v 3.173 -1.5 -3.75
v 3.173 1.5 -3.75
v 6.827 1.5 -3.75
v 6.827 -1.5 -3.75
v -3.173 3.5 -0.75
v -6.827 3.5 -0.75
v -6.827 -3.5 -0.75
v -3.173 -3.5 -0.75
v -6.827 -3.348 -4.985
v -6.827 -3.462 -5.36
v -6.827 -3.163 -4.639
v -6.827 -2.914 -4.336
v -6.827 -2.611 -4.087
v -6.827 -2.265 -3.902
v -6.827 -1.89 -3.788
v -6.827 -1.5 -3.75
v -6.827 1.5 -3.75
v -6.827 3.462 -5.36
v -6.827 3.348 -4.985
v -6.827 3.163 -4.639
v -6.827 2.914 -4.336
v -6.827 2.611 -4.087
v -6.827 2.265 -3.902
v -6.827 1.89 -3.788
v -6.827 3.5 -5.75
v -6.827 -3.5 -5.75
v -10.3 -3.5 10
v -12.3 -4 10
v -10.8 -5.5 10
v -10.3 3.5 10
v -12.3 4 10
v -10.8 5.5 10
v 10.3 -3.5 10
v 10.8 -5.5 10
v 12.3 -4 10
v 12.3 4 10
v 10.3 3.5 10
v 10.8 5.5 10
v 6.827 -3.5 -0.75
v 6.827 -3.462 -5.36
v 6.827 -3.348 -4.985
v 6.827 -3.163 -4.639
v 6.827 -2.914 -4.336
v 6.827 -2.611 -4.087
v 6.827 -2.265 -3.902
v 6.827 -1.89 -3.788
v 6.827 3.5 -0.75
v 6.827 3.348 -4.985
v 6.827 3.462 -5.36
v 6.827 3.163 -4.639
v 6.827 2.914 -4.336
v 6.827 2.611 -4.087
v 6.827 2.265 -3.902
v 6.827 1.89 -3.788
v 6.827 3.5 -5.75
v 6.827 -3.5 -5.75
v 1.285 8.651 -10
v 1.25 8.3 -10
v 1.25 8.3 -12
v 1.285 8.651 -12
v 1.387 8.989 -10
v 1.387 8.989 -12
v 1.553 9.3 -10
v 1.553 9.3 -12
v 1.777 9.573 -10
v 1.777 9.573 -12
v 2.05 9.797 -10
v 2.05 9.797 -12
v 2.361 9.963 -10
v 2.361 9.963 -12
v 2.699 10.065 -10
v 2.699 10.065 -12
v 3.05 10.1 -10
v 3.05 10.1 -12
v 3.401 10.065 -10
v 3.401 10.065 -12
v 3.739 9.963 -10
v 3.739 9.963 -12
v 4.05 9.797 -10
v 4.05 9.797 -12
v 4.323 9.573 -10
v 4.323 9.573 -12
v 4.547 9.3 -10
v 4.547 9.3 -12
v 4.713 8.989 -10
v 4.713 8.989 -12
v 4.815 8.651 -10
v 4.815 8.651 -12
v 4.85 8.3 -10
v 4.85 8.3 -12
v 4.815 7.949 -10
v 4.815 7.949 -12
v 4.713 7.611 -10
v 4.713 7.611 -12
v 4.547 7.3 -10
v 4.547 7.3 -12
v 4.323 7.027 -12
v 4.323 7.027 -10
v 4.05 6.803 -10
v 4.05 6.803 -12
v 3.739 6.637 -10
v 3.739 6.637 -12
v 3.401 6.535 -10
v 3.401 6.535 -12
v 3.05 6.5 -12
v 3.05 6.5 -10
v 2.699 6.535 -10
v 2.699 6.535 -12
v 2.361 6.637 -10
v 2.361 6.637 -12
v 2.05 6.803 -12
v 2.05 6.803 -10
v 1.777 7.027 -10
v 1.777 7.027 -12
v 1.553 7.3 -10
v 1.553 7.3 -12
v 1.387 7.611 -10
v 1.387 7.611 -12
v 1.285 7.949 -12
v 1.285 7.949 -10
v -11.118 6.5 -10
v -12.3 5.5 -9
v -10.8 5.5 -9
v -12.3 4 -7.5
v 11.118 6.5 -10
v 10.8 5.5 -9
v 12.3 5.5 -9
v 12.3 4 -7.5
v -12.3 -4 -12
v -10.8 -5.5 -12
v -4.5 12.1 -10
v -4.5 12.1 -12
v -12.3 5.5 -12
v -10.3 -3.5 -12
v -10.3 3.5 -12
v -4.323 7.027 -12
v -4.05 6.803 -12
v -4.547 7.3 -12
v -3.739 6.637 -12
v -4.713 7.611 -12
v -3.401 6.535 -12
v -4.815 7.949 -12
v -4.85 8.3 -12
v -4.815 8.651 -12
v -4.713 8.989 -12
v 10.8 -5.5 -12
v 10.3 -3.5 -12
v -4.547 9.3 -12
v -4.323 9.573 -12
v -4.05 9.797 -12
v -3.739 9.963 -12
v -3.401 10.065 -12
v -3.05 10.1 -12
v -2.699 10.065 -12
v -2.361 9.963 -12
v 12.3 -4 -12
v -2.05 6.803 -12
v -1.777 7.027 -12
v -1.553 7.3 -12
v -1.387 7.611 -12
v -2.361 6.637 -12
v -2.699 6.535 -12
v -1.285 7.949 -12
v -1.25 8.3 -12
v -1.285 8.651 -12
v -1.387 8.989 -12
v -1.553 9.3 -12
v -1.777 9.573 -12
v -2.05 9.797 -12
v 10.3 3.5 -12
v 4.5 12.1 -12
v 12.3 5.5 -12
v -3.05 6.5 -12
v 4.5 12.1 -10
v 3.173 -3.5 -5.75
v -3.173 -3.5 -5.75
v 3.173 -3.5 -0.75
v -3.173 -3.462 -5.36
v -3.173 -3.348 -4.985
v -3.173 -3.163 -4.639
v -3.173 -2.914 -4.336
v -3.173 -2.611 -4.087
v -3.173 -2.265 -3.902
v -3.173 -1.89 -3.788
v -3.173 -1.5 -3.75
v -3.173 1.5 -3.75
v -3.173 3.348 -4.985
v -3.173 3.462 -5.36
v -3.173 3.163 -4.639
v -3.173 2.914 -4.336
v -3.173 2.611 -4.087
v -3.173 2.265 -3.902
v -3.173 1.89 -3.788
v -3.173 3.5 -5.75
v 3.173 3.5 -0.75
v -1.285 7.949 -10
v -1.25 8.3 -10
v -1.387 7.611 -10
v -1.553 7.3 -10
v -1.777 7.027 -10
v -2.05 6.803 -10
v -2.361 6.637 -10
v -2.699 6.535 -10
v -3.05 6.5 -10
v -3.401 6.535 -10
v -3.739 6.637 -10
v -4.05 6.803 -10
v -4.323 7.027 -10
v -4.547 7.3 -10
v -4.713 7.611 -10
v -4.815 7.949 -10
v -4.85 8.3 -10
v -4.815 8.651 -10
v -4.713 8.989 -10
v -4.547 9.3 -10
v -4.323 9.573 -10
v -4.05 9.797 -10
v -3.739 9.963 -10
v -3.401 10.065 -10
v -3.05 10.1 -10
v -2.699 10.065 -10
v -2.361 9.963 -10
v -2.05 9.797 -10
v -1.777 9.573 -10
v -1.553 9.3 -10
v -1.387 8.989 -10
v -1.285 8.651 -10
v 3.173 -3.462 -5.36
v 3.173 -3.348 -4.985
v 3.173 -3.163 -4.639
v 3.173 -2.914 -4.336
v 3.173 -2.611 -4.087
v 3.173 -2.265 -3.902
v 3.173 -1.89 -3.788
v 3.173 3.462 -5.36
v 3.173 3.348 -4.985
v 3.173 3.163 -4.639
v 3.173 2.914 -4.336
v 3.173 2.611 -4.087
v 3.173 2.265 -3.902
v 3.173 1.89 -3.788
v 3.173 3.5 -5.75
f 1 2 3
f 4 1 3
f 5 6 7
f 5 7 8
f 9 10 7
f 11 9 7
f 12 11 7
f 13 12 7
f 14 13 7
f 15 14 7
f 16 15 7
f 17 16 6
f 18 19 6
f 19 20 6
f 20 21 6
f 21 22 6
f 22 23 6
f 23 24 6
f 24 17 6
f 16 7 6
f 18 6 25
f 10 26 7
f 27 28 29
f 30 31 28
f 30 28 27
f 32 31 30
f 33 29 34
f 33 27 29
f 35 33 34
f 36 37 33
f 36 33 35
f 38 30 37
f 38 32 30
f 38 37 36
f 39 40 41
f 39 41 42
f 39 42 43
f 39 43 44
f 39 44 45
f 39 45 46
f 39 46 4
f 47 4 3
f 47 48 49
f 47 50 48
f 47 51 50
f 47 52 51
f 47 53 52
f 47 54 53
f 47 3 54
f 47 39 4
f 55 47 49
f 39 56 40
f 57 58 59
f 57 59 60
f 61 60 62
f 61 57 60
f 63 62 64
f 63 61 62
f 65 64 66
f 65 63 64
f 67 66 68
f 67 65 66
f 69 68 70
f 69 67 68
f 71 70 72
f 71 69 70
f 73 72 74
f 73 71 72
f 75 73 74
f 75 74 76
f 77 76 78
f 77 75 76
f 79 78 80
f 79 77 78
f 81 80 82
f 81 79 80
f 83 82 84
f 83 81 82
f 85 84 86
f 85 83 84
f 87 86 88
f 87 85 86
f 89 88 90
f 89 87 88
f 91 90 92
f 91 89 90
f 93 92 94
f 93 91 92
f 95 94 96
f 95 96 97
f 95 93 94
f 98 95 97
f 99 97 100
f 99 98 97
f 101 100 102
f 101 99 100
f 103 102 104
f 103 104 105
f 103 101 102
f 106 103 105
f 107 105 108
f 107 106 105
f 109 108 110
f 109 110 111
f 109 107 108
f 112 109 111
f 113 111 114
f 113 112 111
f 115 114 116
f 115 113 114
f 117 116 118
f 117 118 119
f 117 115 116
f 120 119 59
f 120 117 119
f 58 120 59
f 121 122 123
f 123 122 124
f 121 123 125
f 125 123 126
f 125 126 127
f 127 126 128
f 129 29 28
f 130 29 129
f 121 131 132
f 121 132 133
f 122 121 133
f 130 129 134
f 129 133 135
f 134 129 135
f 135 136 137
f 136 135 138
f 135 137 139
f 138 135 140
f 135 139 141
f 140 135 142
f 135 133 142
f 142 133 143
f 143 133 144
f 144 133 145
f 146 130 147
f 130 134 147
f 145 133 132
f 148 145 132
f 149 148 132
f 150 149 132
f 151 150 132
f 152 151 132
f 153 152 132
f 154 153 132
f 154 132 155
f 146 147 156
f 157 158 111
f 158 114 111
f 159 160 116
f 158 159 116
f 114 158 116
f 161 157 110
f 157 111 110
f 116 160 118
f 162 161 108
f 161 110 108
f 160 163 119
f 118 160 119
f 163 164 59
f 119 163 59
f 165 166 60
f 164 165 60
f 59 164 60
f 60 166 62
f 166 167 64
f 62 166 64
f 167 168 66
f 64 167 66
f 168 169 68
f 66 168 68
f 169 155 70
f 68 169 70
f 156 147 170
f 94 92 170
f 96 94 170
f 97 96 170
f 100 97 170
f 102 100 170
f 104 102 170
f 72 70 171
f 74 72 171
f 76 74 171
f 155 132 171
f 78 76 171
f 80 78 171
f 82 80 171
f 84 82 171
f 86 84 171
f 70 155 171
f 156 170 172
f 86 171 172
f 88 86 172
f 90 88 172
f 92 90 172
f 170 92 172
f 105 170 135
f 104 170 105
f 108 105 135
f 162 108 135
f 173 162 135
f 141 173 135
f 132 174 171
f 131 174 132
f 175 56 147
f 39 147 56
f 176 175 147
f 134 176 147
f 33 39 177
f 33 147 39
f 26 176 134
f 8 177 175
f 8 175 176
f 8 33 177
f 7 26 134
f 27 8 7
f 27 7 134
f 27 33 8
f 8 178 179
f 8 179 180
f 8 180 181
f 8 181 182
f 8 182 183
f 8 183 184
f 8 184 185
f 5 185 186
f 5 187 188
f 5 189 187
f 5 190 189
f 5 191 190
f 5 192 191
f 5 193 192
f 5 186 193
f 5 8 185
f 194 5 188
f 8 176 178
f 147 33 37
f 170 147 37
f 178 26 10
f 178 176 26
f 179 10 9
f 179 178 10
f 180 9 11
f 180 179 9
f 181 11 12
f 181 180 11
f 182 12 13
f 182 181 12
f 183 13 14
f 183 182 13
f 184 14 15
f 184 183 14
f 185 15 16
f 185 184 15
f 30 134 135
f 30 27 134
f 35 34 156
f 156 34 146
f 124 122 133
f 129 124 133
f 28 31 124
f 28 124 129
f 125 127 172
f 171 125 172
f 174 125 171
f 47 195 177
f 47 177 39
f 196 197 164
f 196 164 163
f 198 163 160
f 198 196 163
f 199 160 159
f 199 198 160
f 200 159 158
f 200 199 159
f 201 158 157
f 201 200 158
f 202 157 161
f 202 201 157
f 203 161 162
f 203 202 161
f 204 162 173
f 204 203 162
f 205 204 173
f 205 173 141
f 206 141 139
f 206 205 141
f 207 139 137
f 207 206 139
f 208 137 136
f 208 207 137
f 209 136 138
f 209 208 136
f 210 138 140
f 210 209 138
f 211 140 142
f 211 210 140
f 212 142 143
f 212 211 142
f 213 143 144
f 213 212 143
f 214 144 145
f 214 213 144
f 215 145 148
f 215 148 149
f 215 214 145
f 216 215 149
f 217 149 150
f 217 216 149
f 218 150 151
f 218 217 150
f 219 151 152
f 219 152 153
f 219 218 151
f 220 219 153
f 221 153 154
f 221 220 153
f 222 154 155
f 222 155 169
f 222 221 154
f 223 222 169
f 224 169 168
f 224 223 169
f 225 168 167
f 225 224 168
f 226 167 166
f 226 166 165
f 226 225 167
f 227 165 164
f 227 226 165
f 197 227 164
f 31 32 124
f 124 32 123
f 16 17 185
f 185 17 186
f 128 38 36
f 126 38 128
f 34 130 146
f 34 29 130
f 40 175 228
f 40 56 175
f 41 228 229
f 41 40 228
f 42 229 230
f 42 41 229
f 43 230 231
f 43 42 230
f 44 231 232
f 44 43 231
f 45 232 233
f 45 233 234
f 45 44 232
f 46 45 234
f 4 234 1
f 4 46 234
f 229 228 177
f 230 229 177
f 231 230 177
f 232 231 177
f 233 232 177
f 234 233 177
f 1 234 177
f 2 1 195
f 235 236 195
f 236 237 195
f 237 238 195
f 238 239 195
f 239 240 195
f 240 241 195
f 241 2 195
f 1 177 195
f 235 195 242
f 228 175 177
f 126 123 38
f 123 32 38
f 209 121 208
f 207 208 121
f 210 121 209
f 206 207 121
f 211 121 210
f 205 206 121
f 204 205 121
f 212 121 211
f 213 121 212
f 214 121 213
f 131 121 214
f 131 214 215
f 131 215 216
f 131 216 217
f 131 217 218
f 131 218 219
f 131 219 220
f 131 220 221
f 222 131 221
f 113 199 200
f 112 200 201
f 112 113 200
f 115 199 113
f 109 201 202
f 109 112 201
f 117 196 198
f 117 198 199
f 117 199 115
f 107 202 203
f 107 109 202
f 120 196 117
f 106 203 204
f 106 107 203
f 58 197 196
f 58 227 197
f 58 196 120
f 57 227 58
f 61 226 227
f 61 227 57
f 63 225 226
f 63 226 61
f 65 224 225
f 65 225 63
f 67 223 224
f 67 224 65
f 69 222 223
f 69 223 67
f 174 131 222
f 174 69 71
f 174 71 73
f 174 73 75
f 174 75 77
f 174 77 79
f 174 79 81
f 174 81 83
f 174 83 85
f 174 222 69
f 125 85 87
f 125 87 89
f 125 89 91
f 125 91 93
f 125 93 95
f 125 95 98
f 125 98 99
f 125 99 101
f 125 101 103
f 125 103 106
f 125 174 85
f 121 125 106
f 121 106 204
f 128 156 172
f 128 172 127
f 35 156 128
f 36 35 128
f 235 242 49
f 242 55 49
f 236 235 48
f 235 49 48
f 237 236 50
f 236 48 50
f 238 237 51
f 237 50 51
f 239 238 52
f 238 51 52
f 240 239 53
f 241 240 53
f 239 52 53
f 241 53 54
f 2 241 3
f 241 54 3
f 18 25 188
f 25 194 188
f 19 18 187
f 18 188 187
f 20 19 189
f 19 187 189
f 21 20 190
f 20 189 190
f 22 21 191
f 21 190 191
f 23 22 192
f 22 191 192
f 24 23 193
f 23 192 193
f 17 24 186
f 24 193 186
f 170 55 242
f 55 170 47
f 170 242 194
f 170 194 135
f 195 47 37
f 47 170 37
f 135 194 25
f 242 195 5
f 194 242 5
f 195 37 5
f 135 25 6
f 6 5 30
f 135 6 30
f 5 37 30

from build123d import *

# Parameters (mm, degrees)
ESBO_O1_W                = 24.6
ESBO_O1_H                = 11
ESBO_O1_W_2              = 20.6
ESBO_O1_H_2              = 7
RESSALTO_EXTRUS_O1_DEPTH = 10
ESBO_O2_R                = 1.8
ESBO_O2_W                = 20.6
ESBO_O2_H                = 7
RESSALTO_EXTRUS_O2_DEPTH = 2
CHANFRO4_SIZE            = 1
CHANFRO2_SIZE            = 1.5
ESBO_O3_W                = 3.653589711
ESBO_O3_H                = 7
ESBO_O3_W_2              = 3.653589584
RESSALTO_EXTRUS_O3_DEPTH = 3
FILETE3_R                = 2


with BuildPart() as part:
    # Esboço1 → Ressalto-extrusão1 (new, symmetric)
    with BuildSketch(Plane.XY):
        Rectangle(ESBO_O1_W, ESBO_O1_H)
        Rectangle(ESBO_O1_W_2, ESBO_O1_H_2, mode=Mode.SUBTRACT)
    extrude(amount=RESSALTO_EXTRUS_O1_DEPTH, both=True)

    # Esboço2 → Ressalto-extrusão2 (add)
    with BuildSketch(Plane(origin=(0, 0, -10), x_dir=(-1, 0, 0), z_dir=(0, 0, -1))):
        Polygon((-12.3, -5.5), (-12.3, 5.5), (-4.5, 12.1), (4.5, 12.1), (12.3, 5.5), (12.3, -5.5), align=None)
        with Locations((-3.05, 8.3)):
            Circle(ESBO_O2_R, mode=Mode.SUBTRACT)
        with Locations(Location((3.05, 8.3, 0), (0, 0, 180))):
            Circle(ESBO_O2_R, mode=Mode.SUBTRACT)
        Rectangle(ESBO_O2_W, ESBO_O2_H, mode=Mode.SUBTRACT)
    extrude(amount=RESSALTO_EXTRUS_O2_DEPTH)

    # Chanfro4
    chanfro4_edges = [part.edges().sort_by_distance(p)[0] for p in [
        (0, 5.5, -10),
    ]]
    chamfer(chanfro4_edges, length=CHANFRO4_SIZE - 0.0001)  # a hair under: the kernel refuses the full size

    # Chanfro2
    chanfro2_edges = [part.edges().sort_by_distance(p)[0] for p in [
        (12.3, 5.5, 0.49995),
        (12.3, -5.5, -1),
        (-12.3, -5.5, -1),
        (-12.3, 5.5, 0.49995),
    ]]
    chamfer(chanfro2_edges, length=CHANFRO2_SIZE)

    # Esboço3 → Ressalto-extrusão3 (add)
    with BuildSketch(Plane.XY.offset(-0.75)):
        with Locations((-5.000000063, 0)):
            Rectangle(ESBO_O3_W, ESBO_O3_H)
        with Locations((5, 0)):
            Rectangle(ESBO_O3_W_2, ESBO_O3_H)
    extrude(amount=-RESSALTO_EXTRUS_O3_DEPTH)

    # Filete3
    filete3_edges = [part.edges().sort_by_distance(p)[0] for p in [
        (-5.000000064, 3.5, -3.75),
        (-5.000000064, -3.5, -3.75),
        (5, 3.5, -3.75),
        (5, -3.5, -3.75),
    ]]
    fillet(filete3_edges, radius=FILETE3_R)


solid = part.part
